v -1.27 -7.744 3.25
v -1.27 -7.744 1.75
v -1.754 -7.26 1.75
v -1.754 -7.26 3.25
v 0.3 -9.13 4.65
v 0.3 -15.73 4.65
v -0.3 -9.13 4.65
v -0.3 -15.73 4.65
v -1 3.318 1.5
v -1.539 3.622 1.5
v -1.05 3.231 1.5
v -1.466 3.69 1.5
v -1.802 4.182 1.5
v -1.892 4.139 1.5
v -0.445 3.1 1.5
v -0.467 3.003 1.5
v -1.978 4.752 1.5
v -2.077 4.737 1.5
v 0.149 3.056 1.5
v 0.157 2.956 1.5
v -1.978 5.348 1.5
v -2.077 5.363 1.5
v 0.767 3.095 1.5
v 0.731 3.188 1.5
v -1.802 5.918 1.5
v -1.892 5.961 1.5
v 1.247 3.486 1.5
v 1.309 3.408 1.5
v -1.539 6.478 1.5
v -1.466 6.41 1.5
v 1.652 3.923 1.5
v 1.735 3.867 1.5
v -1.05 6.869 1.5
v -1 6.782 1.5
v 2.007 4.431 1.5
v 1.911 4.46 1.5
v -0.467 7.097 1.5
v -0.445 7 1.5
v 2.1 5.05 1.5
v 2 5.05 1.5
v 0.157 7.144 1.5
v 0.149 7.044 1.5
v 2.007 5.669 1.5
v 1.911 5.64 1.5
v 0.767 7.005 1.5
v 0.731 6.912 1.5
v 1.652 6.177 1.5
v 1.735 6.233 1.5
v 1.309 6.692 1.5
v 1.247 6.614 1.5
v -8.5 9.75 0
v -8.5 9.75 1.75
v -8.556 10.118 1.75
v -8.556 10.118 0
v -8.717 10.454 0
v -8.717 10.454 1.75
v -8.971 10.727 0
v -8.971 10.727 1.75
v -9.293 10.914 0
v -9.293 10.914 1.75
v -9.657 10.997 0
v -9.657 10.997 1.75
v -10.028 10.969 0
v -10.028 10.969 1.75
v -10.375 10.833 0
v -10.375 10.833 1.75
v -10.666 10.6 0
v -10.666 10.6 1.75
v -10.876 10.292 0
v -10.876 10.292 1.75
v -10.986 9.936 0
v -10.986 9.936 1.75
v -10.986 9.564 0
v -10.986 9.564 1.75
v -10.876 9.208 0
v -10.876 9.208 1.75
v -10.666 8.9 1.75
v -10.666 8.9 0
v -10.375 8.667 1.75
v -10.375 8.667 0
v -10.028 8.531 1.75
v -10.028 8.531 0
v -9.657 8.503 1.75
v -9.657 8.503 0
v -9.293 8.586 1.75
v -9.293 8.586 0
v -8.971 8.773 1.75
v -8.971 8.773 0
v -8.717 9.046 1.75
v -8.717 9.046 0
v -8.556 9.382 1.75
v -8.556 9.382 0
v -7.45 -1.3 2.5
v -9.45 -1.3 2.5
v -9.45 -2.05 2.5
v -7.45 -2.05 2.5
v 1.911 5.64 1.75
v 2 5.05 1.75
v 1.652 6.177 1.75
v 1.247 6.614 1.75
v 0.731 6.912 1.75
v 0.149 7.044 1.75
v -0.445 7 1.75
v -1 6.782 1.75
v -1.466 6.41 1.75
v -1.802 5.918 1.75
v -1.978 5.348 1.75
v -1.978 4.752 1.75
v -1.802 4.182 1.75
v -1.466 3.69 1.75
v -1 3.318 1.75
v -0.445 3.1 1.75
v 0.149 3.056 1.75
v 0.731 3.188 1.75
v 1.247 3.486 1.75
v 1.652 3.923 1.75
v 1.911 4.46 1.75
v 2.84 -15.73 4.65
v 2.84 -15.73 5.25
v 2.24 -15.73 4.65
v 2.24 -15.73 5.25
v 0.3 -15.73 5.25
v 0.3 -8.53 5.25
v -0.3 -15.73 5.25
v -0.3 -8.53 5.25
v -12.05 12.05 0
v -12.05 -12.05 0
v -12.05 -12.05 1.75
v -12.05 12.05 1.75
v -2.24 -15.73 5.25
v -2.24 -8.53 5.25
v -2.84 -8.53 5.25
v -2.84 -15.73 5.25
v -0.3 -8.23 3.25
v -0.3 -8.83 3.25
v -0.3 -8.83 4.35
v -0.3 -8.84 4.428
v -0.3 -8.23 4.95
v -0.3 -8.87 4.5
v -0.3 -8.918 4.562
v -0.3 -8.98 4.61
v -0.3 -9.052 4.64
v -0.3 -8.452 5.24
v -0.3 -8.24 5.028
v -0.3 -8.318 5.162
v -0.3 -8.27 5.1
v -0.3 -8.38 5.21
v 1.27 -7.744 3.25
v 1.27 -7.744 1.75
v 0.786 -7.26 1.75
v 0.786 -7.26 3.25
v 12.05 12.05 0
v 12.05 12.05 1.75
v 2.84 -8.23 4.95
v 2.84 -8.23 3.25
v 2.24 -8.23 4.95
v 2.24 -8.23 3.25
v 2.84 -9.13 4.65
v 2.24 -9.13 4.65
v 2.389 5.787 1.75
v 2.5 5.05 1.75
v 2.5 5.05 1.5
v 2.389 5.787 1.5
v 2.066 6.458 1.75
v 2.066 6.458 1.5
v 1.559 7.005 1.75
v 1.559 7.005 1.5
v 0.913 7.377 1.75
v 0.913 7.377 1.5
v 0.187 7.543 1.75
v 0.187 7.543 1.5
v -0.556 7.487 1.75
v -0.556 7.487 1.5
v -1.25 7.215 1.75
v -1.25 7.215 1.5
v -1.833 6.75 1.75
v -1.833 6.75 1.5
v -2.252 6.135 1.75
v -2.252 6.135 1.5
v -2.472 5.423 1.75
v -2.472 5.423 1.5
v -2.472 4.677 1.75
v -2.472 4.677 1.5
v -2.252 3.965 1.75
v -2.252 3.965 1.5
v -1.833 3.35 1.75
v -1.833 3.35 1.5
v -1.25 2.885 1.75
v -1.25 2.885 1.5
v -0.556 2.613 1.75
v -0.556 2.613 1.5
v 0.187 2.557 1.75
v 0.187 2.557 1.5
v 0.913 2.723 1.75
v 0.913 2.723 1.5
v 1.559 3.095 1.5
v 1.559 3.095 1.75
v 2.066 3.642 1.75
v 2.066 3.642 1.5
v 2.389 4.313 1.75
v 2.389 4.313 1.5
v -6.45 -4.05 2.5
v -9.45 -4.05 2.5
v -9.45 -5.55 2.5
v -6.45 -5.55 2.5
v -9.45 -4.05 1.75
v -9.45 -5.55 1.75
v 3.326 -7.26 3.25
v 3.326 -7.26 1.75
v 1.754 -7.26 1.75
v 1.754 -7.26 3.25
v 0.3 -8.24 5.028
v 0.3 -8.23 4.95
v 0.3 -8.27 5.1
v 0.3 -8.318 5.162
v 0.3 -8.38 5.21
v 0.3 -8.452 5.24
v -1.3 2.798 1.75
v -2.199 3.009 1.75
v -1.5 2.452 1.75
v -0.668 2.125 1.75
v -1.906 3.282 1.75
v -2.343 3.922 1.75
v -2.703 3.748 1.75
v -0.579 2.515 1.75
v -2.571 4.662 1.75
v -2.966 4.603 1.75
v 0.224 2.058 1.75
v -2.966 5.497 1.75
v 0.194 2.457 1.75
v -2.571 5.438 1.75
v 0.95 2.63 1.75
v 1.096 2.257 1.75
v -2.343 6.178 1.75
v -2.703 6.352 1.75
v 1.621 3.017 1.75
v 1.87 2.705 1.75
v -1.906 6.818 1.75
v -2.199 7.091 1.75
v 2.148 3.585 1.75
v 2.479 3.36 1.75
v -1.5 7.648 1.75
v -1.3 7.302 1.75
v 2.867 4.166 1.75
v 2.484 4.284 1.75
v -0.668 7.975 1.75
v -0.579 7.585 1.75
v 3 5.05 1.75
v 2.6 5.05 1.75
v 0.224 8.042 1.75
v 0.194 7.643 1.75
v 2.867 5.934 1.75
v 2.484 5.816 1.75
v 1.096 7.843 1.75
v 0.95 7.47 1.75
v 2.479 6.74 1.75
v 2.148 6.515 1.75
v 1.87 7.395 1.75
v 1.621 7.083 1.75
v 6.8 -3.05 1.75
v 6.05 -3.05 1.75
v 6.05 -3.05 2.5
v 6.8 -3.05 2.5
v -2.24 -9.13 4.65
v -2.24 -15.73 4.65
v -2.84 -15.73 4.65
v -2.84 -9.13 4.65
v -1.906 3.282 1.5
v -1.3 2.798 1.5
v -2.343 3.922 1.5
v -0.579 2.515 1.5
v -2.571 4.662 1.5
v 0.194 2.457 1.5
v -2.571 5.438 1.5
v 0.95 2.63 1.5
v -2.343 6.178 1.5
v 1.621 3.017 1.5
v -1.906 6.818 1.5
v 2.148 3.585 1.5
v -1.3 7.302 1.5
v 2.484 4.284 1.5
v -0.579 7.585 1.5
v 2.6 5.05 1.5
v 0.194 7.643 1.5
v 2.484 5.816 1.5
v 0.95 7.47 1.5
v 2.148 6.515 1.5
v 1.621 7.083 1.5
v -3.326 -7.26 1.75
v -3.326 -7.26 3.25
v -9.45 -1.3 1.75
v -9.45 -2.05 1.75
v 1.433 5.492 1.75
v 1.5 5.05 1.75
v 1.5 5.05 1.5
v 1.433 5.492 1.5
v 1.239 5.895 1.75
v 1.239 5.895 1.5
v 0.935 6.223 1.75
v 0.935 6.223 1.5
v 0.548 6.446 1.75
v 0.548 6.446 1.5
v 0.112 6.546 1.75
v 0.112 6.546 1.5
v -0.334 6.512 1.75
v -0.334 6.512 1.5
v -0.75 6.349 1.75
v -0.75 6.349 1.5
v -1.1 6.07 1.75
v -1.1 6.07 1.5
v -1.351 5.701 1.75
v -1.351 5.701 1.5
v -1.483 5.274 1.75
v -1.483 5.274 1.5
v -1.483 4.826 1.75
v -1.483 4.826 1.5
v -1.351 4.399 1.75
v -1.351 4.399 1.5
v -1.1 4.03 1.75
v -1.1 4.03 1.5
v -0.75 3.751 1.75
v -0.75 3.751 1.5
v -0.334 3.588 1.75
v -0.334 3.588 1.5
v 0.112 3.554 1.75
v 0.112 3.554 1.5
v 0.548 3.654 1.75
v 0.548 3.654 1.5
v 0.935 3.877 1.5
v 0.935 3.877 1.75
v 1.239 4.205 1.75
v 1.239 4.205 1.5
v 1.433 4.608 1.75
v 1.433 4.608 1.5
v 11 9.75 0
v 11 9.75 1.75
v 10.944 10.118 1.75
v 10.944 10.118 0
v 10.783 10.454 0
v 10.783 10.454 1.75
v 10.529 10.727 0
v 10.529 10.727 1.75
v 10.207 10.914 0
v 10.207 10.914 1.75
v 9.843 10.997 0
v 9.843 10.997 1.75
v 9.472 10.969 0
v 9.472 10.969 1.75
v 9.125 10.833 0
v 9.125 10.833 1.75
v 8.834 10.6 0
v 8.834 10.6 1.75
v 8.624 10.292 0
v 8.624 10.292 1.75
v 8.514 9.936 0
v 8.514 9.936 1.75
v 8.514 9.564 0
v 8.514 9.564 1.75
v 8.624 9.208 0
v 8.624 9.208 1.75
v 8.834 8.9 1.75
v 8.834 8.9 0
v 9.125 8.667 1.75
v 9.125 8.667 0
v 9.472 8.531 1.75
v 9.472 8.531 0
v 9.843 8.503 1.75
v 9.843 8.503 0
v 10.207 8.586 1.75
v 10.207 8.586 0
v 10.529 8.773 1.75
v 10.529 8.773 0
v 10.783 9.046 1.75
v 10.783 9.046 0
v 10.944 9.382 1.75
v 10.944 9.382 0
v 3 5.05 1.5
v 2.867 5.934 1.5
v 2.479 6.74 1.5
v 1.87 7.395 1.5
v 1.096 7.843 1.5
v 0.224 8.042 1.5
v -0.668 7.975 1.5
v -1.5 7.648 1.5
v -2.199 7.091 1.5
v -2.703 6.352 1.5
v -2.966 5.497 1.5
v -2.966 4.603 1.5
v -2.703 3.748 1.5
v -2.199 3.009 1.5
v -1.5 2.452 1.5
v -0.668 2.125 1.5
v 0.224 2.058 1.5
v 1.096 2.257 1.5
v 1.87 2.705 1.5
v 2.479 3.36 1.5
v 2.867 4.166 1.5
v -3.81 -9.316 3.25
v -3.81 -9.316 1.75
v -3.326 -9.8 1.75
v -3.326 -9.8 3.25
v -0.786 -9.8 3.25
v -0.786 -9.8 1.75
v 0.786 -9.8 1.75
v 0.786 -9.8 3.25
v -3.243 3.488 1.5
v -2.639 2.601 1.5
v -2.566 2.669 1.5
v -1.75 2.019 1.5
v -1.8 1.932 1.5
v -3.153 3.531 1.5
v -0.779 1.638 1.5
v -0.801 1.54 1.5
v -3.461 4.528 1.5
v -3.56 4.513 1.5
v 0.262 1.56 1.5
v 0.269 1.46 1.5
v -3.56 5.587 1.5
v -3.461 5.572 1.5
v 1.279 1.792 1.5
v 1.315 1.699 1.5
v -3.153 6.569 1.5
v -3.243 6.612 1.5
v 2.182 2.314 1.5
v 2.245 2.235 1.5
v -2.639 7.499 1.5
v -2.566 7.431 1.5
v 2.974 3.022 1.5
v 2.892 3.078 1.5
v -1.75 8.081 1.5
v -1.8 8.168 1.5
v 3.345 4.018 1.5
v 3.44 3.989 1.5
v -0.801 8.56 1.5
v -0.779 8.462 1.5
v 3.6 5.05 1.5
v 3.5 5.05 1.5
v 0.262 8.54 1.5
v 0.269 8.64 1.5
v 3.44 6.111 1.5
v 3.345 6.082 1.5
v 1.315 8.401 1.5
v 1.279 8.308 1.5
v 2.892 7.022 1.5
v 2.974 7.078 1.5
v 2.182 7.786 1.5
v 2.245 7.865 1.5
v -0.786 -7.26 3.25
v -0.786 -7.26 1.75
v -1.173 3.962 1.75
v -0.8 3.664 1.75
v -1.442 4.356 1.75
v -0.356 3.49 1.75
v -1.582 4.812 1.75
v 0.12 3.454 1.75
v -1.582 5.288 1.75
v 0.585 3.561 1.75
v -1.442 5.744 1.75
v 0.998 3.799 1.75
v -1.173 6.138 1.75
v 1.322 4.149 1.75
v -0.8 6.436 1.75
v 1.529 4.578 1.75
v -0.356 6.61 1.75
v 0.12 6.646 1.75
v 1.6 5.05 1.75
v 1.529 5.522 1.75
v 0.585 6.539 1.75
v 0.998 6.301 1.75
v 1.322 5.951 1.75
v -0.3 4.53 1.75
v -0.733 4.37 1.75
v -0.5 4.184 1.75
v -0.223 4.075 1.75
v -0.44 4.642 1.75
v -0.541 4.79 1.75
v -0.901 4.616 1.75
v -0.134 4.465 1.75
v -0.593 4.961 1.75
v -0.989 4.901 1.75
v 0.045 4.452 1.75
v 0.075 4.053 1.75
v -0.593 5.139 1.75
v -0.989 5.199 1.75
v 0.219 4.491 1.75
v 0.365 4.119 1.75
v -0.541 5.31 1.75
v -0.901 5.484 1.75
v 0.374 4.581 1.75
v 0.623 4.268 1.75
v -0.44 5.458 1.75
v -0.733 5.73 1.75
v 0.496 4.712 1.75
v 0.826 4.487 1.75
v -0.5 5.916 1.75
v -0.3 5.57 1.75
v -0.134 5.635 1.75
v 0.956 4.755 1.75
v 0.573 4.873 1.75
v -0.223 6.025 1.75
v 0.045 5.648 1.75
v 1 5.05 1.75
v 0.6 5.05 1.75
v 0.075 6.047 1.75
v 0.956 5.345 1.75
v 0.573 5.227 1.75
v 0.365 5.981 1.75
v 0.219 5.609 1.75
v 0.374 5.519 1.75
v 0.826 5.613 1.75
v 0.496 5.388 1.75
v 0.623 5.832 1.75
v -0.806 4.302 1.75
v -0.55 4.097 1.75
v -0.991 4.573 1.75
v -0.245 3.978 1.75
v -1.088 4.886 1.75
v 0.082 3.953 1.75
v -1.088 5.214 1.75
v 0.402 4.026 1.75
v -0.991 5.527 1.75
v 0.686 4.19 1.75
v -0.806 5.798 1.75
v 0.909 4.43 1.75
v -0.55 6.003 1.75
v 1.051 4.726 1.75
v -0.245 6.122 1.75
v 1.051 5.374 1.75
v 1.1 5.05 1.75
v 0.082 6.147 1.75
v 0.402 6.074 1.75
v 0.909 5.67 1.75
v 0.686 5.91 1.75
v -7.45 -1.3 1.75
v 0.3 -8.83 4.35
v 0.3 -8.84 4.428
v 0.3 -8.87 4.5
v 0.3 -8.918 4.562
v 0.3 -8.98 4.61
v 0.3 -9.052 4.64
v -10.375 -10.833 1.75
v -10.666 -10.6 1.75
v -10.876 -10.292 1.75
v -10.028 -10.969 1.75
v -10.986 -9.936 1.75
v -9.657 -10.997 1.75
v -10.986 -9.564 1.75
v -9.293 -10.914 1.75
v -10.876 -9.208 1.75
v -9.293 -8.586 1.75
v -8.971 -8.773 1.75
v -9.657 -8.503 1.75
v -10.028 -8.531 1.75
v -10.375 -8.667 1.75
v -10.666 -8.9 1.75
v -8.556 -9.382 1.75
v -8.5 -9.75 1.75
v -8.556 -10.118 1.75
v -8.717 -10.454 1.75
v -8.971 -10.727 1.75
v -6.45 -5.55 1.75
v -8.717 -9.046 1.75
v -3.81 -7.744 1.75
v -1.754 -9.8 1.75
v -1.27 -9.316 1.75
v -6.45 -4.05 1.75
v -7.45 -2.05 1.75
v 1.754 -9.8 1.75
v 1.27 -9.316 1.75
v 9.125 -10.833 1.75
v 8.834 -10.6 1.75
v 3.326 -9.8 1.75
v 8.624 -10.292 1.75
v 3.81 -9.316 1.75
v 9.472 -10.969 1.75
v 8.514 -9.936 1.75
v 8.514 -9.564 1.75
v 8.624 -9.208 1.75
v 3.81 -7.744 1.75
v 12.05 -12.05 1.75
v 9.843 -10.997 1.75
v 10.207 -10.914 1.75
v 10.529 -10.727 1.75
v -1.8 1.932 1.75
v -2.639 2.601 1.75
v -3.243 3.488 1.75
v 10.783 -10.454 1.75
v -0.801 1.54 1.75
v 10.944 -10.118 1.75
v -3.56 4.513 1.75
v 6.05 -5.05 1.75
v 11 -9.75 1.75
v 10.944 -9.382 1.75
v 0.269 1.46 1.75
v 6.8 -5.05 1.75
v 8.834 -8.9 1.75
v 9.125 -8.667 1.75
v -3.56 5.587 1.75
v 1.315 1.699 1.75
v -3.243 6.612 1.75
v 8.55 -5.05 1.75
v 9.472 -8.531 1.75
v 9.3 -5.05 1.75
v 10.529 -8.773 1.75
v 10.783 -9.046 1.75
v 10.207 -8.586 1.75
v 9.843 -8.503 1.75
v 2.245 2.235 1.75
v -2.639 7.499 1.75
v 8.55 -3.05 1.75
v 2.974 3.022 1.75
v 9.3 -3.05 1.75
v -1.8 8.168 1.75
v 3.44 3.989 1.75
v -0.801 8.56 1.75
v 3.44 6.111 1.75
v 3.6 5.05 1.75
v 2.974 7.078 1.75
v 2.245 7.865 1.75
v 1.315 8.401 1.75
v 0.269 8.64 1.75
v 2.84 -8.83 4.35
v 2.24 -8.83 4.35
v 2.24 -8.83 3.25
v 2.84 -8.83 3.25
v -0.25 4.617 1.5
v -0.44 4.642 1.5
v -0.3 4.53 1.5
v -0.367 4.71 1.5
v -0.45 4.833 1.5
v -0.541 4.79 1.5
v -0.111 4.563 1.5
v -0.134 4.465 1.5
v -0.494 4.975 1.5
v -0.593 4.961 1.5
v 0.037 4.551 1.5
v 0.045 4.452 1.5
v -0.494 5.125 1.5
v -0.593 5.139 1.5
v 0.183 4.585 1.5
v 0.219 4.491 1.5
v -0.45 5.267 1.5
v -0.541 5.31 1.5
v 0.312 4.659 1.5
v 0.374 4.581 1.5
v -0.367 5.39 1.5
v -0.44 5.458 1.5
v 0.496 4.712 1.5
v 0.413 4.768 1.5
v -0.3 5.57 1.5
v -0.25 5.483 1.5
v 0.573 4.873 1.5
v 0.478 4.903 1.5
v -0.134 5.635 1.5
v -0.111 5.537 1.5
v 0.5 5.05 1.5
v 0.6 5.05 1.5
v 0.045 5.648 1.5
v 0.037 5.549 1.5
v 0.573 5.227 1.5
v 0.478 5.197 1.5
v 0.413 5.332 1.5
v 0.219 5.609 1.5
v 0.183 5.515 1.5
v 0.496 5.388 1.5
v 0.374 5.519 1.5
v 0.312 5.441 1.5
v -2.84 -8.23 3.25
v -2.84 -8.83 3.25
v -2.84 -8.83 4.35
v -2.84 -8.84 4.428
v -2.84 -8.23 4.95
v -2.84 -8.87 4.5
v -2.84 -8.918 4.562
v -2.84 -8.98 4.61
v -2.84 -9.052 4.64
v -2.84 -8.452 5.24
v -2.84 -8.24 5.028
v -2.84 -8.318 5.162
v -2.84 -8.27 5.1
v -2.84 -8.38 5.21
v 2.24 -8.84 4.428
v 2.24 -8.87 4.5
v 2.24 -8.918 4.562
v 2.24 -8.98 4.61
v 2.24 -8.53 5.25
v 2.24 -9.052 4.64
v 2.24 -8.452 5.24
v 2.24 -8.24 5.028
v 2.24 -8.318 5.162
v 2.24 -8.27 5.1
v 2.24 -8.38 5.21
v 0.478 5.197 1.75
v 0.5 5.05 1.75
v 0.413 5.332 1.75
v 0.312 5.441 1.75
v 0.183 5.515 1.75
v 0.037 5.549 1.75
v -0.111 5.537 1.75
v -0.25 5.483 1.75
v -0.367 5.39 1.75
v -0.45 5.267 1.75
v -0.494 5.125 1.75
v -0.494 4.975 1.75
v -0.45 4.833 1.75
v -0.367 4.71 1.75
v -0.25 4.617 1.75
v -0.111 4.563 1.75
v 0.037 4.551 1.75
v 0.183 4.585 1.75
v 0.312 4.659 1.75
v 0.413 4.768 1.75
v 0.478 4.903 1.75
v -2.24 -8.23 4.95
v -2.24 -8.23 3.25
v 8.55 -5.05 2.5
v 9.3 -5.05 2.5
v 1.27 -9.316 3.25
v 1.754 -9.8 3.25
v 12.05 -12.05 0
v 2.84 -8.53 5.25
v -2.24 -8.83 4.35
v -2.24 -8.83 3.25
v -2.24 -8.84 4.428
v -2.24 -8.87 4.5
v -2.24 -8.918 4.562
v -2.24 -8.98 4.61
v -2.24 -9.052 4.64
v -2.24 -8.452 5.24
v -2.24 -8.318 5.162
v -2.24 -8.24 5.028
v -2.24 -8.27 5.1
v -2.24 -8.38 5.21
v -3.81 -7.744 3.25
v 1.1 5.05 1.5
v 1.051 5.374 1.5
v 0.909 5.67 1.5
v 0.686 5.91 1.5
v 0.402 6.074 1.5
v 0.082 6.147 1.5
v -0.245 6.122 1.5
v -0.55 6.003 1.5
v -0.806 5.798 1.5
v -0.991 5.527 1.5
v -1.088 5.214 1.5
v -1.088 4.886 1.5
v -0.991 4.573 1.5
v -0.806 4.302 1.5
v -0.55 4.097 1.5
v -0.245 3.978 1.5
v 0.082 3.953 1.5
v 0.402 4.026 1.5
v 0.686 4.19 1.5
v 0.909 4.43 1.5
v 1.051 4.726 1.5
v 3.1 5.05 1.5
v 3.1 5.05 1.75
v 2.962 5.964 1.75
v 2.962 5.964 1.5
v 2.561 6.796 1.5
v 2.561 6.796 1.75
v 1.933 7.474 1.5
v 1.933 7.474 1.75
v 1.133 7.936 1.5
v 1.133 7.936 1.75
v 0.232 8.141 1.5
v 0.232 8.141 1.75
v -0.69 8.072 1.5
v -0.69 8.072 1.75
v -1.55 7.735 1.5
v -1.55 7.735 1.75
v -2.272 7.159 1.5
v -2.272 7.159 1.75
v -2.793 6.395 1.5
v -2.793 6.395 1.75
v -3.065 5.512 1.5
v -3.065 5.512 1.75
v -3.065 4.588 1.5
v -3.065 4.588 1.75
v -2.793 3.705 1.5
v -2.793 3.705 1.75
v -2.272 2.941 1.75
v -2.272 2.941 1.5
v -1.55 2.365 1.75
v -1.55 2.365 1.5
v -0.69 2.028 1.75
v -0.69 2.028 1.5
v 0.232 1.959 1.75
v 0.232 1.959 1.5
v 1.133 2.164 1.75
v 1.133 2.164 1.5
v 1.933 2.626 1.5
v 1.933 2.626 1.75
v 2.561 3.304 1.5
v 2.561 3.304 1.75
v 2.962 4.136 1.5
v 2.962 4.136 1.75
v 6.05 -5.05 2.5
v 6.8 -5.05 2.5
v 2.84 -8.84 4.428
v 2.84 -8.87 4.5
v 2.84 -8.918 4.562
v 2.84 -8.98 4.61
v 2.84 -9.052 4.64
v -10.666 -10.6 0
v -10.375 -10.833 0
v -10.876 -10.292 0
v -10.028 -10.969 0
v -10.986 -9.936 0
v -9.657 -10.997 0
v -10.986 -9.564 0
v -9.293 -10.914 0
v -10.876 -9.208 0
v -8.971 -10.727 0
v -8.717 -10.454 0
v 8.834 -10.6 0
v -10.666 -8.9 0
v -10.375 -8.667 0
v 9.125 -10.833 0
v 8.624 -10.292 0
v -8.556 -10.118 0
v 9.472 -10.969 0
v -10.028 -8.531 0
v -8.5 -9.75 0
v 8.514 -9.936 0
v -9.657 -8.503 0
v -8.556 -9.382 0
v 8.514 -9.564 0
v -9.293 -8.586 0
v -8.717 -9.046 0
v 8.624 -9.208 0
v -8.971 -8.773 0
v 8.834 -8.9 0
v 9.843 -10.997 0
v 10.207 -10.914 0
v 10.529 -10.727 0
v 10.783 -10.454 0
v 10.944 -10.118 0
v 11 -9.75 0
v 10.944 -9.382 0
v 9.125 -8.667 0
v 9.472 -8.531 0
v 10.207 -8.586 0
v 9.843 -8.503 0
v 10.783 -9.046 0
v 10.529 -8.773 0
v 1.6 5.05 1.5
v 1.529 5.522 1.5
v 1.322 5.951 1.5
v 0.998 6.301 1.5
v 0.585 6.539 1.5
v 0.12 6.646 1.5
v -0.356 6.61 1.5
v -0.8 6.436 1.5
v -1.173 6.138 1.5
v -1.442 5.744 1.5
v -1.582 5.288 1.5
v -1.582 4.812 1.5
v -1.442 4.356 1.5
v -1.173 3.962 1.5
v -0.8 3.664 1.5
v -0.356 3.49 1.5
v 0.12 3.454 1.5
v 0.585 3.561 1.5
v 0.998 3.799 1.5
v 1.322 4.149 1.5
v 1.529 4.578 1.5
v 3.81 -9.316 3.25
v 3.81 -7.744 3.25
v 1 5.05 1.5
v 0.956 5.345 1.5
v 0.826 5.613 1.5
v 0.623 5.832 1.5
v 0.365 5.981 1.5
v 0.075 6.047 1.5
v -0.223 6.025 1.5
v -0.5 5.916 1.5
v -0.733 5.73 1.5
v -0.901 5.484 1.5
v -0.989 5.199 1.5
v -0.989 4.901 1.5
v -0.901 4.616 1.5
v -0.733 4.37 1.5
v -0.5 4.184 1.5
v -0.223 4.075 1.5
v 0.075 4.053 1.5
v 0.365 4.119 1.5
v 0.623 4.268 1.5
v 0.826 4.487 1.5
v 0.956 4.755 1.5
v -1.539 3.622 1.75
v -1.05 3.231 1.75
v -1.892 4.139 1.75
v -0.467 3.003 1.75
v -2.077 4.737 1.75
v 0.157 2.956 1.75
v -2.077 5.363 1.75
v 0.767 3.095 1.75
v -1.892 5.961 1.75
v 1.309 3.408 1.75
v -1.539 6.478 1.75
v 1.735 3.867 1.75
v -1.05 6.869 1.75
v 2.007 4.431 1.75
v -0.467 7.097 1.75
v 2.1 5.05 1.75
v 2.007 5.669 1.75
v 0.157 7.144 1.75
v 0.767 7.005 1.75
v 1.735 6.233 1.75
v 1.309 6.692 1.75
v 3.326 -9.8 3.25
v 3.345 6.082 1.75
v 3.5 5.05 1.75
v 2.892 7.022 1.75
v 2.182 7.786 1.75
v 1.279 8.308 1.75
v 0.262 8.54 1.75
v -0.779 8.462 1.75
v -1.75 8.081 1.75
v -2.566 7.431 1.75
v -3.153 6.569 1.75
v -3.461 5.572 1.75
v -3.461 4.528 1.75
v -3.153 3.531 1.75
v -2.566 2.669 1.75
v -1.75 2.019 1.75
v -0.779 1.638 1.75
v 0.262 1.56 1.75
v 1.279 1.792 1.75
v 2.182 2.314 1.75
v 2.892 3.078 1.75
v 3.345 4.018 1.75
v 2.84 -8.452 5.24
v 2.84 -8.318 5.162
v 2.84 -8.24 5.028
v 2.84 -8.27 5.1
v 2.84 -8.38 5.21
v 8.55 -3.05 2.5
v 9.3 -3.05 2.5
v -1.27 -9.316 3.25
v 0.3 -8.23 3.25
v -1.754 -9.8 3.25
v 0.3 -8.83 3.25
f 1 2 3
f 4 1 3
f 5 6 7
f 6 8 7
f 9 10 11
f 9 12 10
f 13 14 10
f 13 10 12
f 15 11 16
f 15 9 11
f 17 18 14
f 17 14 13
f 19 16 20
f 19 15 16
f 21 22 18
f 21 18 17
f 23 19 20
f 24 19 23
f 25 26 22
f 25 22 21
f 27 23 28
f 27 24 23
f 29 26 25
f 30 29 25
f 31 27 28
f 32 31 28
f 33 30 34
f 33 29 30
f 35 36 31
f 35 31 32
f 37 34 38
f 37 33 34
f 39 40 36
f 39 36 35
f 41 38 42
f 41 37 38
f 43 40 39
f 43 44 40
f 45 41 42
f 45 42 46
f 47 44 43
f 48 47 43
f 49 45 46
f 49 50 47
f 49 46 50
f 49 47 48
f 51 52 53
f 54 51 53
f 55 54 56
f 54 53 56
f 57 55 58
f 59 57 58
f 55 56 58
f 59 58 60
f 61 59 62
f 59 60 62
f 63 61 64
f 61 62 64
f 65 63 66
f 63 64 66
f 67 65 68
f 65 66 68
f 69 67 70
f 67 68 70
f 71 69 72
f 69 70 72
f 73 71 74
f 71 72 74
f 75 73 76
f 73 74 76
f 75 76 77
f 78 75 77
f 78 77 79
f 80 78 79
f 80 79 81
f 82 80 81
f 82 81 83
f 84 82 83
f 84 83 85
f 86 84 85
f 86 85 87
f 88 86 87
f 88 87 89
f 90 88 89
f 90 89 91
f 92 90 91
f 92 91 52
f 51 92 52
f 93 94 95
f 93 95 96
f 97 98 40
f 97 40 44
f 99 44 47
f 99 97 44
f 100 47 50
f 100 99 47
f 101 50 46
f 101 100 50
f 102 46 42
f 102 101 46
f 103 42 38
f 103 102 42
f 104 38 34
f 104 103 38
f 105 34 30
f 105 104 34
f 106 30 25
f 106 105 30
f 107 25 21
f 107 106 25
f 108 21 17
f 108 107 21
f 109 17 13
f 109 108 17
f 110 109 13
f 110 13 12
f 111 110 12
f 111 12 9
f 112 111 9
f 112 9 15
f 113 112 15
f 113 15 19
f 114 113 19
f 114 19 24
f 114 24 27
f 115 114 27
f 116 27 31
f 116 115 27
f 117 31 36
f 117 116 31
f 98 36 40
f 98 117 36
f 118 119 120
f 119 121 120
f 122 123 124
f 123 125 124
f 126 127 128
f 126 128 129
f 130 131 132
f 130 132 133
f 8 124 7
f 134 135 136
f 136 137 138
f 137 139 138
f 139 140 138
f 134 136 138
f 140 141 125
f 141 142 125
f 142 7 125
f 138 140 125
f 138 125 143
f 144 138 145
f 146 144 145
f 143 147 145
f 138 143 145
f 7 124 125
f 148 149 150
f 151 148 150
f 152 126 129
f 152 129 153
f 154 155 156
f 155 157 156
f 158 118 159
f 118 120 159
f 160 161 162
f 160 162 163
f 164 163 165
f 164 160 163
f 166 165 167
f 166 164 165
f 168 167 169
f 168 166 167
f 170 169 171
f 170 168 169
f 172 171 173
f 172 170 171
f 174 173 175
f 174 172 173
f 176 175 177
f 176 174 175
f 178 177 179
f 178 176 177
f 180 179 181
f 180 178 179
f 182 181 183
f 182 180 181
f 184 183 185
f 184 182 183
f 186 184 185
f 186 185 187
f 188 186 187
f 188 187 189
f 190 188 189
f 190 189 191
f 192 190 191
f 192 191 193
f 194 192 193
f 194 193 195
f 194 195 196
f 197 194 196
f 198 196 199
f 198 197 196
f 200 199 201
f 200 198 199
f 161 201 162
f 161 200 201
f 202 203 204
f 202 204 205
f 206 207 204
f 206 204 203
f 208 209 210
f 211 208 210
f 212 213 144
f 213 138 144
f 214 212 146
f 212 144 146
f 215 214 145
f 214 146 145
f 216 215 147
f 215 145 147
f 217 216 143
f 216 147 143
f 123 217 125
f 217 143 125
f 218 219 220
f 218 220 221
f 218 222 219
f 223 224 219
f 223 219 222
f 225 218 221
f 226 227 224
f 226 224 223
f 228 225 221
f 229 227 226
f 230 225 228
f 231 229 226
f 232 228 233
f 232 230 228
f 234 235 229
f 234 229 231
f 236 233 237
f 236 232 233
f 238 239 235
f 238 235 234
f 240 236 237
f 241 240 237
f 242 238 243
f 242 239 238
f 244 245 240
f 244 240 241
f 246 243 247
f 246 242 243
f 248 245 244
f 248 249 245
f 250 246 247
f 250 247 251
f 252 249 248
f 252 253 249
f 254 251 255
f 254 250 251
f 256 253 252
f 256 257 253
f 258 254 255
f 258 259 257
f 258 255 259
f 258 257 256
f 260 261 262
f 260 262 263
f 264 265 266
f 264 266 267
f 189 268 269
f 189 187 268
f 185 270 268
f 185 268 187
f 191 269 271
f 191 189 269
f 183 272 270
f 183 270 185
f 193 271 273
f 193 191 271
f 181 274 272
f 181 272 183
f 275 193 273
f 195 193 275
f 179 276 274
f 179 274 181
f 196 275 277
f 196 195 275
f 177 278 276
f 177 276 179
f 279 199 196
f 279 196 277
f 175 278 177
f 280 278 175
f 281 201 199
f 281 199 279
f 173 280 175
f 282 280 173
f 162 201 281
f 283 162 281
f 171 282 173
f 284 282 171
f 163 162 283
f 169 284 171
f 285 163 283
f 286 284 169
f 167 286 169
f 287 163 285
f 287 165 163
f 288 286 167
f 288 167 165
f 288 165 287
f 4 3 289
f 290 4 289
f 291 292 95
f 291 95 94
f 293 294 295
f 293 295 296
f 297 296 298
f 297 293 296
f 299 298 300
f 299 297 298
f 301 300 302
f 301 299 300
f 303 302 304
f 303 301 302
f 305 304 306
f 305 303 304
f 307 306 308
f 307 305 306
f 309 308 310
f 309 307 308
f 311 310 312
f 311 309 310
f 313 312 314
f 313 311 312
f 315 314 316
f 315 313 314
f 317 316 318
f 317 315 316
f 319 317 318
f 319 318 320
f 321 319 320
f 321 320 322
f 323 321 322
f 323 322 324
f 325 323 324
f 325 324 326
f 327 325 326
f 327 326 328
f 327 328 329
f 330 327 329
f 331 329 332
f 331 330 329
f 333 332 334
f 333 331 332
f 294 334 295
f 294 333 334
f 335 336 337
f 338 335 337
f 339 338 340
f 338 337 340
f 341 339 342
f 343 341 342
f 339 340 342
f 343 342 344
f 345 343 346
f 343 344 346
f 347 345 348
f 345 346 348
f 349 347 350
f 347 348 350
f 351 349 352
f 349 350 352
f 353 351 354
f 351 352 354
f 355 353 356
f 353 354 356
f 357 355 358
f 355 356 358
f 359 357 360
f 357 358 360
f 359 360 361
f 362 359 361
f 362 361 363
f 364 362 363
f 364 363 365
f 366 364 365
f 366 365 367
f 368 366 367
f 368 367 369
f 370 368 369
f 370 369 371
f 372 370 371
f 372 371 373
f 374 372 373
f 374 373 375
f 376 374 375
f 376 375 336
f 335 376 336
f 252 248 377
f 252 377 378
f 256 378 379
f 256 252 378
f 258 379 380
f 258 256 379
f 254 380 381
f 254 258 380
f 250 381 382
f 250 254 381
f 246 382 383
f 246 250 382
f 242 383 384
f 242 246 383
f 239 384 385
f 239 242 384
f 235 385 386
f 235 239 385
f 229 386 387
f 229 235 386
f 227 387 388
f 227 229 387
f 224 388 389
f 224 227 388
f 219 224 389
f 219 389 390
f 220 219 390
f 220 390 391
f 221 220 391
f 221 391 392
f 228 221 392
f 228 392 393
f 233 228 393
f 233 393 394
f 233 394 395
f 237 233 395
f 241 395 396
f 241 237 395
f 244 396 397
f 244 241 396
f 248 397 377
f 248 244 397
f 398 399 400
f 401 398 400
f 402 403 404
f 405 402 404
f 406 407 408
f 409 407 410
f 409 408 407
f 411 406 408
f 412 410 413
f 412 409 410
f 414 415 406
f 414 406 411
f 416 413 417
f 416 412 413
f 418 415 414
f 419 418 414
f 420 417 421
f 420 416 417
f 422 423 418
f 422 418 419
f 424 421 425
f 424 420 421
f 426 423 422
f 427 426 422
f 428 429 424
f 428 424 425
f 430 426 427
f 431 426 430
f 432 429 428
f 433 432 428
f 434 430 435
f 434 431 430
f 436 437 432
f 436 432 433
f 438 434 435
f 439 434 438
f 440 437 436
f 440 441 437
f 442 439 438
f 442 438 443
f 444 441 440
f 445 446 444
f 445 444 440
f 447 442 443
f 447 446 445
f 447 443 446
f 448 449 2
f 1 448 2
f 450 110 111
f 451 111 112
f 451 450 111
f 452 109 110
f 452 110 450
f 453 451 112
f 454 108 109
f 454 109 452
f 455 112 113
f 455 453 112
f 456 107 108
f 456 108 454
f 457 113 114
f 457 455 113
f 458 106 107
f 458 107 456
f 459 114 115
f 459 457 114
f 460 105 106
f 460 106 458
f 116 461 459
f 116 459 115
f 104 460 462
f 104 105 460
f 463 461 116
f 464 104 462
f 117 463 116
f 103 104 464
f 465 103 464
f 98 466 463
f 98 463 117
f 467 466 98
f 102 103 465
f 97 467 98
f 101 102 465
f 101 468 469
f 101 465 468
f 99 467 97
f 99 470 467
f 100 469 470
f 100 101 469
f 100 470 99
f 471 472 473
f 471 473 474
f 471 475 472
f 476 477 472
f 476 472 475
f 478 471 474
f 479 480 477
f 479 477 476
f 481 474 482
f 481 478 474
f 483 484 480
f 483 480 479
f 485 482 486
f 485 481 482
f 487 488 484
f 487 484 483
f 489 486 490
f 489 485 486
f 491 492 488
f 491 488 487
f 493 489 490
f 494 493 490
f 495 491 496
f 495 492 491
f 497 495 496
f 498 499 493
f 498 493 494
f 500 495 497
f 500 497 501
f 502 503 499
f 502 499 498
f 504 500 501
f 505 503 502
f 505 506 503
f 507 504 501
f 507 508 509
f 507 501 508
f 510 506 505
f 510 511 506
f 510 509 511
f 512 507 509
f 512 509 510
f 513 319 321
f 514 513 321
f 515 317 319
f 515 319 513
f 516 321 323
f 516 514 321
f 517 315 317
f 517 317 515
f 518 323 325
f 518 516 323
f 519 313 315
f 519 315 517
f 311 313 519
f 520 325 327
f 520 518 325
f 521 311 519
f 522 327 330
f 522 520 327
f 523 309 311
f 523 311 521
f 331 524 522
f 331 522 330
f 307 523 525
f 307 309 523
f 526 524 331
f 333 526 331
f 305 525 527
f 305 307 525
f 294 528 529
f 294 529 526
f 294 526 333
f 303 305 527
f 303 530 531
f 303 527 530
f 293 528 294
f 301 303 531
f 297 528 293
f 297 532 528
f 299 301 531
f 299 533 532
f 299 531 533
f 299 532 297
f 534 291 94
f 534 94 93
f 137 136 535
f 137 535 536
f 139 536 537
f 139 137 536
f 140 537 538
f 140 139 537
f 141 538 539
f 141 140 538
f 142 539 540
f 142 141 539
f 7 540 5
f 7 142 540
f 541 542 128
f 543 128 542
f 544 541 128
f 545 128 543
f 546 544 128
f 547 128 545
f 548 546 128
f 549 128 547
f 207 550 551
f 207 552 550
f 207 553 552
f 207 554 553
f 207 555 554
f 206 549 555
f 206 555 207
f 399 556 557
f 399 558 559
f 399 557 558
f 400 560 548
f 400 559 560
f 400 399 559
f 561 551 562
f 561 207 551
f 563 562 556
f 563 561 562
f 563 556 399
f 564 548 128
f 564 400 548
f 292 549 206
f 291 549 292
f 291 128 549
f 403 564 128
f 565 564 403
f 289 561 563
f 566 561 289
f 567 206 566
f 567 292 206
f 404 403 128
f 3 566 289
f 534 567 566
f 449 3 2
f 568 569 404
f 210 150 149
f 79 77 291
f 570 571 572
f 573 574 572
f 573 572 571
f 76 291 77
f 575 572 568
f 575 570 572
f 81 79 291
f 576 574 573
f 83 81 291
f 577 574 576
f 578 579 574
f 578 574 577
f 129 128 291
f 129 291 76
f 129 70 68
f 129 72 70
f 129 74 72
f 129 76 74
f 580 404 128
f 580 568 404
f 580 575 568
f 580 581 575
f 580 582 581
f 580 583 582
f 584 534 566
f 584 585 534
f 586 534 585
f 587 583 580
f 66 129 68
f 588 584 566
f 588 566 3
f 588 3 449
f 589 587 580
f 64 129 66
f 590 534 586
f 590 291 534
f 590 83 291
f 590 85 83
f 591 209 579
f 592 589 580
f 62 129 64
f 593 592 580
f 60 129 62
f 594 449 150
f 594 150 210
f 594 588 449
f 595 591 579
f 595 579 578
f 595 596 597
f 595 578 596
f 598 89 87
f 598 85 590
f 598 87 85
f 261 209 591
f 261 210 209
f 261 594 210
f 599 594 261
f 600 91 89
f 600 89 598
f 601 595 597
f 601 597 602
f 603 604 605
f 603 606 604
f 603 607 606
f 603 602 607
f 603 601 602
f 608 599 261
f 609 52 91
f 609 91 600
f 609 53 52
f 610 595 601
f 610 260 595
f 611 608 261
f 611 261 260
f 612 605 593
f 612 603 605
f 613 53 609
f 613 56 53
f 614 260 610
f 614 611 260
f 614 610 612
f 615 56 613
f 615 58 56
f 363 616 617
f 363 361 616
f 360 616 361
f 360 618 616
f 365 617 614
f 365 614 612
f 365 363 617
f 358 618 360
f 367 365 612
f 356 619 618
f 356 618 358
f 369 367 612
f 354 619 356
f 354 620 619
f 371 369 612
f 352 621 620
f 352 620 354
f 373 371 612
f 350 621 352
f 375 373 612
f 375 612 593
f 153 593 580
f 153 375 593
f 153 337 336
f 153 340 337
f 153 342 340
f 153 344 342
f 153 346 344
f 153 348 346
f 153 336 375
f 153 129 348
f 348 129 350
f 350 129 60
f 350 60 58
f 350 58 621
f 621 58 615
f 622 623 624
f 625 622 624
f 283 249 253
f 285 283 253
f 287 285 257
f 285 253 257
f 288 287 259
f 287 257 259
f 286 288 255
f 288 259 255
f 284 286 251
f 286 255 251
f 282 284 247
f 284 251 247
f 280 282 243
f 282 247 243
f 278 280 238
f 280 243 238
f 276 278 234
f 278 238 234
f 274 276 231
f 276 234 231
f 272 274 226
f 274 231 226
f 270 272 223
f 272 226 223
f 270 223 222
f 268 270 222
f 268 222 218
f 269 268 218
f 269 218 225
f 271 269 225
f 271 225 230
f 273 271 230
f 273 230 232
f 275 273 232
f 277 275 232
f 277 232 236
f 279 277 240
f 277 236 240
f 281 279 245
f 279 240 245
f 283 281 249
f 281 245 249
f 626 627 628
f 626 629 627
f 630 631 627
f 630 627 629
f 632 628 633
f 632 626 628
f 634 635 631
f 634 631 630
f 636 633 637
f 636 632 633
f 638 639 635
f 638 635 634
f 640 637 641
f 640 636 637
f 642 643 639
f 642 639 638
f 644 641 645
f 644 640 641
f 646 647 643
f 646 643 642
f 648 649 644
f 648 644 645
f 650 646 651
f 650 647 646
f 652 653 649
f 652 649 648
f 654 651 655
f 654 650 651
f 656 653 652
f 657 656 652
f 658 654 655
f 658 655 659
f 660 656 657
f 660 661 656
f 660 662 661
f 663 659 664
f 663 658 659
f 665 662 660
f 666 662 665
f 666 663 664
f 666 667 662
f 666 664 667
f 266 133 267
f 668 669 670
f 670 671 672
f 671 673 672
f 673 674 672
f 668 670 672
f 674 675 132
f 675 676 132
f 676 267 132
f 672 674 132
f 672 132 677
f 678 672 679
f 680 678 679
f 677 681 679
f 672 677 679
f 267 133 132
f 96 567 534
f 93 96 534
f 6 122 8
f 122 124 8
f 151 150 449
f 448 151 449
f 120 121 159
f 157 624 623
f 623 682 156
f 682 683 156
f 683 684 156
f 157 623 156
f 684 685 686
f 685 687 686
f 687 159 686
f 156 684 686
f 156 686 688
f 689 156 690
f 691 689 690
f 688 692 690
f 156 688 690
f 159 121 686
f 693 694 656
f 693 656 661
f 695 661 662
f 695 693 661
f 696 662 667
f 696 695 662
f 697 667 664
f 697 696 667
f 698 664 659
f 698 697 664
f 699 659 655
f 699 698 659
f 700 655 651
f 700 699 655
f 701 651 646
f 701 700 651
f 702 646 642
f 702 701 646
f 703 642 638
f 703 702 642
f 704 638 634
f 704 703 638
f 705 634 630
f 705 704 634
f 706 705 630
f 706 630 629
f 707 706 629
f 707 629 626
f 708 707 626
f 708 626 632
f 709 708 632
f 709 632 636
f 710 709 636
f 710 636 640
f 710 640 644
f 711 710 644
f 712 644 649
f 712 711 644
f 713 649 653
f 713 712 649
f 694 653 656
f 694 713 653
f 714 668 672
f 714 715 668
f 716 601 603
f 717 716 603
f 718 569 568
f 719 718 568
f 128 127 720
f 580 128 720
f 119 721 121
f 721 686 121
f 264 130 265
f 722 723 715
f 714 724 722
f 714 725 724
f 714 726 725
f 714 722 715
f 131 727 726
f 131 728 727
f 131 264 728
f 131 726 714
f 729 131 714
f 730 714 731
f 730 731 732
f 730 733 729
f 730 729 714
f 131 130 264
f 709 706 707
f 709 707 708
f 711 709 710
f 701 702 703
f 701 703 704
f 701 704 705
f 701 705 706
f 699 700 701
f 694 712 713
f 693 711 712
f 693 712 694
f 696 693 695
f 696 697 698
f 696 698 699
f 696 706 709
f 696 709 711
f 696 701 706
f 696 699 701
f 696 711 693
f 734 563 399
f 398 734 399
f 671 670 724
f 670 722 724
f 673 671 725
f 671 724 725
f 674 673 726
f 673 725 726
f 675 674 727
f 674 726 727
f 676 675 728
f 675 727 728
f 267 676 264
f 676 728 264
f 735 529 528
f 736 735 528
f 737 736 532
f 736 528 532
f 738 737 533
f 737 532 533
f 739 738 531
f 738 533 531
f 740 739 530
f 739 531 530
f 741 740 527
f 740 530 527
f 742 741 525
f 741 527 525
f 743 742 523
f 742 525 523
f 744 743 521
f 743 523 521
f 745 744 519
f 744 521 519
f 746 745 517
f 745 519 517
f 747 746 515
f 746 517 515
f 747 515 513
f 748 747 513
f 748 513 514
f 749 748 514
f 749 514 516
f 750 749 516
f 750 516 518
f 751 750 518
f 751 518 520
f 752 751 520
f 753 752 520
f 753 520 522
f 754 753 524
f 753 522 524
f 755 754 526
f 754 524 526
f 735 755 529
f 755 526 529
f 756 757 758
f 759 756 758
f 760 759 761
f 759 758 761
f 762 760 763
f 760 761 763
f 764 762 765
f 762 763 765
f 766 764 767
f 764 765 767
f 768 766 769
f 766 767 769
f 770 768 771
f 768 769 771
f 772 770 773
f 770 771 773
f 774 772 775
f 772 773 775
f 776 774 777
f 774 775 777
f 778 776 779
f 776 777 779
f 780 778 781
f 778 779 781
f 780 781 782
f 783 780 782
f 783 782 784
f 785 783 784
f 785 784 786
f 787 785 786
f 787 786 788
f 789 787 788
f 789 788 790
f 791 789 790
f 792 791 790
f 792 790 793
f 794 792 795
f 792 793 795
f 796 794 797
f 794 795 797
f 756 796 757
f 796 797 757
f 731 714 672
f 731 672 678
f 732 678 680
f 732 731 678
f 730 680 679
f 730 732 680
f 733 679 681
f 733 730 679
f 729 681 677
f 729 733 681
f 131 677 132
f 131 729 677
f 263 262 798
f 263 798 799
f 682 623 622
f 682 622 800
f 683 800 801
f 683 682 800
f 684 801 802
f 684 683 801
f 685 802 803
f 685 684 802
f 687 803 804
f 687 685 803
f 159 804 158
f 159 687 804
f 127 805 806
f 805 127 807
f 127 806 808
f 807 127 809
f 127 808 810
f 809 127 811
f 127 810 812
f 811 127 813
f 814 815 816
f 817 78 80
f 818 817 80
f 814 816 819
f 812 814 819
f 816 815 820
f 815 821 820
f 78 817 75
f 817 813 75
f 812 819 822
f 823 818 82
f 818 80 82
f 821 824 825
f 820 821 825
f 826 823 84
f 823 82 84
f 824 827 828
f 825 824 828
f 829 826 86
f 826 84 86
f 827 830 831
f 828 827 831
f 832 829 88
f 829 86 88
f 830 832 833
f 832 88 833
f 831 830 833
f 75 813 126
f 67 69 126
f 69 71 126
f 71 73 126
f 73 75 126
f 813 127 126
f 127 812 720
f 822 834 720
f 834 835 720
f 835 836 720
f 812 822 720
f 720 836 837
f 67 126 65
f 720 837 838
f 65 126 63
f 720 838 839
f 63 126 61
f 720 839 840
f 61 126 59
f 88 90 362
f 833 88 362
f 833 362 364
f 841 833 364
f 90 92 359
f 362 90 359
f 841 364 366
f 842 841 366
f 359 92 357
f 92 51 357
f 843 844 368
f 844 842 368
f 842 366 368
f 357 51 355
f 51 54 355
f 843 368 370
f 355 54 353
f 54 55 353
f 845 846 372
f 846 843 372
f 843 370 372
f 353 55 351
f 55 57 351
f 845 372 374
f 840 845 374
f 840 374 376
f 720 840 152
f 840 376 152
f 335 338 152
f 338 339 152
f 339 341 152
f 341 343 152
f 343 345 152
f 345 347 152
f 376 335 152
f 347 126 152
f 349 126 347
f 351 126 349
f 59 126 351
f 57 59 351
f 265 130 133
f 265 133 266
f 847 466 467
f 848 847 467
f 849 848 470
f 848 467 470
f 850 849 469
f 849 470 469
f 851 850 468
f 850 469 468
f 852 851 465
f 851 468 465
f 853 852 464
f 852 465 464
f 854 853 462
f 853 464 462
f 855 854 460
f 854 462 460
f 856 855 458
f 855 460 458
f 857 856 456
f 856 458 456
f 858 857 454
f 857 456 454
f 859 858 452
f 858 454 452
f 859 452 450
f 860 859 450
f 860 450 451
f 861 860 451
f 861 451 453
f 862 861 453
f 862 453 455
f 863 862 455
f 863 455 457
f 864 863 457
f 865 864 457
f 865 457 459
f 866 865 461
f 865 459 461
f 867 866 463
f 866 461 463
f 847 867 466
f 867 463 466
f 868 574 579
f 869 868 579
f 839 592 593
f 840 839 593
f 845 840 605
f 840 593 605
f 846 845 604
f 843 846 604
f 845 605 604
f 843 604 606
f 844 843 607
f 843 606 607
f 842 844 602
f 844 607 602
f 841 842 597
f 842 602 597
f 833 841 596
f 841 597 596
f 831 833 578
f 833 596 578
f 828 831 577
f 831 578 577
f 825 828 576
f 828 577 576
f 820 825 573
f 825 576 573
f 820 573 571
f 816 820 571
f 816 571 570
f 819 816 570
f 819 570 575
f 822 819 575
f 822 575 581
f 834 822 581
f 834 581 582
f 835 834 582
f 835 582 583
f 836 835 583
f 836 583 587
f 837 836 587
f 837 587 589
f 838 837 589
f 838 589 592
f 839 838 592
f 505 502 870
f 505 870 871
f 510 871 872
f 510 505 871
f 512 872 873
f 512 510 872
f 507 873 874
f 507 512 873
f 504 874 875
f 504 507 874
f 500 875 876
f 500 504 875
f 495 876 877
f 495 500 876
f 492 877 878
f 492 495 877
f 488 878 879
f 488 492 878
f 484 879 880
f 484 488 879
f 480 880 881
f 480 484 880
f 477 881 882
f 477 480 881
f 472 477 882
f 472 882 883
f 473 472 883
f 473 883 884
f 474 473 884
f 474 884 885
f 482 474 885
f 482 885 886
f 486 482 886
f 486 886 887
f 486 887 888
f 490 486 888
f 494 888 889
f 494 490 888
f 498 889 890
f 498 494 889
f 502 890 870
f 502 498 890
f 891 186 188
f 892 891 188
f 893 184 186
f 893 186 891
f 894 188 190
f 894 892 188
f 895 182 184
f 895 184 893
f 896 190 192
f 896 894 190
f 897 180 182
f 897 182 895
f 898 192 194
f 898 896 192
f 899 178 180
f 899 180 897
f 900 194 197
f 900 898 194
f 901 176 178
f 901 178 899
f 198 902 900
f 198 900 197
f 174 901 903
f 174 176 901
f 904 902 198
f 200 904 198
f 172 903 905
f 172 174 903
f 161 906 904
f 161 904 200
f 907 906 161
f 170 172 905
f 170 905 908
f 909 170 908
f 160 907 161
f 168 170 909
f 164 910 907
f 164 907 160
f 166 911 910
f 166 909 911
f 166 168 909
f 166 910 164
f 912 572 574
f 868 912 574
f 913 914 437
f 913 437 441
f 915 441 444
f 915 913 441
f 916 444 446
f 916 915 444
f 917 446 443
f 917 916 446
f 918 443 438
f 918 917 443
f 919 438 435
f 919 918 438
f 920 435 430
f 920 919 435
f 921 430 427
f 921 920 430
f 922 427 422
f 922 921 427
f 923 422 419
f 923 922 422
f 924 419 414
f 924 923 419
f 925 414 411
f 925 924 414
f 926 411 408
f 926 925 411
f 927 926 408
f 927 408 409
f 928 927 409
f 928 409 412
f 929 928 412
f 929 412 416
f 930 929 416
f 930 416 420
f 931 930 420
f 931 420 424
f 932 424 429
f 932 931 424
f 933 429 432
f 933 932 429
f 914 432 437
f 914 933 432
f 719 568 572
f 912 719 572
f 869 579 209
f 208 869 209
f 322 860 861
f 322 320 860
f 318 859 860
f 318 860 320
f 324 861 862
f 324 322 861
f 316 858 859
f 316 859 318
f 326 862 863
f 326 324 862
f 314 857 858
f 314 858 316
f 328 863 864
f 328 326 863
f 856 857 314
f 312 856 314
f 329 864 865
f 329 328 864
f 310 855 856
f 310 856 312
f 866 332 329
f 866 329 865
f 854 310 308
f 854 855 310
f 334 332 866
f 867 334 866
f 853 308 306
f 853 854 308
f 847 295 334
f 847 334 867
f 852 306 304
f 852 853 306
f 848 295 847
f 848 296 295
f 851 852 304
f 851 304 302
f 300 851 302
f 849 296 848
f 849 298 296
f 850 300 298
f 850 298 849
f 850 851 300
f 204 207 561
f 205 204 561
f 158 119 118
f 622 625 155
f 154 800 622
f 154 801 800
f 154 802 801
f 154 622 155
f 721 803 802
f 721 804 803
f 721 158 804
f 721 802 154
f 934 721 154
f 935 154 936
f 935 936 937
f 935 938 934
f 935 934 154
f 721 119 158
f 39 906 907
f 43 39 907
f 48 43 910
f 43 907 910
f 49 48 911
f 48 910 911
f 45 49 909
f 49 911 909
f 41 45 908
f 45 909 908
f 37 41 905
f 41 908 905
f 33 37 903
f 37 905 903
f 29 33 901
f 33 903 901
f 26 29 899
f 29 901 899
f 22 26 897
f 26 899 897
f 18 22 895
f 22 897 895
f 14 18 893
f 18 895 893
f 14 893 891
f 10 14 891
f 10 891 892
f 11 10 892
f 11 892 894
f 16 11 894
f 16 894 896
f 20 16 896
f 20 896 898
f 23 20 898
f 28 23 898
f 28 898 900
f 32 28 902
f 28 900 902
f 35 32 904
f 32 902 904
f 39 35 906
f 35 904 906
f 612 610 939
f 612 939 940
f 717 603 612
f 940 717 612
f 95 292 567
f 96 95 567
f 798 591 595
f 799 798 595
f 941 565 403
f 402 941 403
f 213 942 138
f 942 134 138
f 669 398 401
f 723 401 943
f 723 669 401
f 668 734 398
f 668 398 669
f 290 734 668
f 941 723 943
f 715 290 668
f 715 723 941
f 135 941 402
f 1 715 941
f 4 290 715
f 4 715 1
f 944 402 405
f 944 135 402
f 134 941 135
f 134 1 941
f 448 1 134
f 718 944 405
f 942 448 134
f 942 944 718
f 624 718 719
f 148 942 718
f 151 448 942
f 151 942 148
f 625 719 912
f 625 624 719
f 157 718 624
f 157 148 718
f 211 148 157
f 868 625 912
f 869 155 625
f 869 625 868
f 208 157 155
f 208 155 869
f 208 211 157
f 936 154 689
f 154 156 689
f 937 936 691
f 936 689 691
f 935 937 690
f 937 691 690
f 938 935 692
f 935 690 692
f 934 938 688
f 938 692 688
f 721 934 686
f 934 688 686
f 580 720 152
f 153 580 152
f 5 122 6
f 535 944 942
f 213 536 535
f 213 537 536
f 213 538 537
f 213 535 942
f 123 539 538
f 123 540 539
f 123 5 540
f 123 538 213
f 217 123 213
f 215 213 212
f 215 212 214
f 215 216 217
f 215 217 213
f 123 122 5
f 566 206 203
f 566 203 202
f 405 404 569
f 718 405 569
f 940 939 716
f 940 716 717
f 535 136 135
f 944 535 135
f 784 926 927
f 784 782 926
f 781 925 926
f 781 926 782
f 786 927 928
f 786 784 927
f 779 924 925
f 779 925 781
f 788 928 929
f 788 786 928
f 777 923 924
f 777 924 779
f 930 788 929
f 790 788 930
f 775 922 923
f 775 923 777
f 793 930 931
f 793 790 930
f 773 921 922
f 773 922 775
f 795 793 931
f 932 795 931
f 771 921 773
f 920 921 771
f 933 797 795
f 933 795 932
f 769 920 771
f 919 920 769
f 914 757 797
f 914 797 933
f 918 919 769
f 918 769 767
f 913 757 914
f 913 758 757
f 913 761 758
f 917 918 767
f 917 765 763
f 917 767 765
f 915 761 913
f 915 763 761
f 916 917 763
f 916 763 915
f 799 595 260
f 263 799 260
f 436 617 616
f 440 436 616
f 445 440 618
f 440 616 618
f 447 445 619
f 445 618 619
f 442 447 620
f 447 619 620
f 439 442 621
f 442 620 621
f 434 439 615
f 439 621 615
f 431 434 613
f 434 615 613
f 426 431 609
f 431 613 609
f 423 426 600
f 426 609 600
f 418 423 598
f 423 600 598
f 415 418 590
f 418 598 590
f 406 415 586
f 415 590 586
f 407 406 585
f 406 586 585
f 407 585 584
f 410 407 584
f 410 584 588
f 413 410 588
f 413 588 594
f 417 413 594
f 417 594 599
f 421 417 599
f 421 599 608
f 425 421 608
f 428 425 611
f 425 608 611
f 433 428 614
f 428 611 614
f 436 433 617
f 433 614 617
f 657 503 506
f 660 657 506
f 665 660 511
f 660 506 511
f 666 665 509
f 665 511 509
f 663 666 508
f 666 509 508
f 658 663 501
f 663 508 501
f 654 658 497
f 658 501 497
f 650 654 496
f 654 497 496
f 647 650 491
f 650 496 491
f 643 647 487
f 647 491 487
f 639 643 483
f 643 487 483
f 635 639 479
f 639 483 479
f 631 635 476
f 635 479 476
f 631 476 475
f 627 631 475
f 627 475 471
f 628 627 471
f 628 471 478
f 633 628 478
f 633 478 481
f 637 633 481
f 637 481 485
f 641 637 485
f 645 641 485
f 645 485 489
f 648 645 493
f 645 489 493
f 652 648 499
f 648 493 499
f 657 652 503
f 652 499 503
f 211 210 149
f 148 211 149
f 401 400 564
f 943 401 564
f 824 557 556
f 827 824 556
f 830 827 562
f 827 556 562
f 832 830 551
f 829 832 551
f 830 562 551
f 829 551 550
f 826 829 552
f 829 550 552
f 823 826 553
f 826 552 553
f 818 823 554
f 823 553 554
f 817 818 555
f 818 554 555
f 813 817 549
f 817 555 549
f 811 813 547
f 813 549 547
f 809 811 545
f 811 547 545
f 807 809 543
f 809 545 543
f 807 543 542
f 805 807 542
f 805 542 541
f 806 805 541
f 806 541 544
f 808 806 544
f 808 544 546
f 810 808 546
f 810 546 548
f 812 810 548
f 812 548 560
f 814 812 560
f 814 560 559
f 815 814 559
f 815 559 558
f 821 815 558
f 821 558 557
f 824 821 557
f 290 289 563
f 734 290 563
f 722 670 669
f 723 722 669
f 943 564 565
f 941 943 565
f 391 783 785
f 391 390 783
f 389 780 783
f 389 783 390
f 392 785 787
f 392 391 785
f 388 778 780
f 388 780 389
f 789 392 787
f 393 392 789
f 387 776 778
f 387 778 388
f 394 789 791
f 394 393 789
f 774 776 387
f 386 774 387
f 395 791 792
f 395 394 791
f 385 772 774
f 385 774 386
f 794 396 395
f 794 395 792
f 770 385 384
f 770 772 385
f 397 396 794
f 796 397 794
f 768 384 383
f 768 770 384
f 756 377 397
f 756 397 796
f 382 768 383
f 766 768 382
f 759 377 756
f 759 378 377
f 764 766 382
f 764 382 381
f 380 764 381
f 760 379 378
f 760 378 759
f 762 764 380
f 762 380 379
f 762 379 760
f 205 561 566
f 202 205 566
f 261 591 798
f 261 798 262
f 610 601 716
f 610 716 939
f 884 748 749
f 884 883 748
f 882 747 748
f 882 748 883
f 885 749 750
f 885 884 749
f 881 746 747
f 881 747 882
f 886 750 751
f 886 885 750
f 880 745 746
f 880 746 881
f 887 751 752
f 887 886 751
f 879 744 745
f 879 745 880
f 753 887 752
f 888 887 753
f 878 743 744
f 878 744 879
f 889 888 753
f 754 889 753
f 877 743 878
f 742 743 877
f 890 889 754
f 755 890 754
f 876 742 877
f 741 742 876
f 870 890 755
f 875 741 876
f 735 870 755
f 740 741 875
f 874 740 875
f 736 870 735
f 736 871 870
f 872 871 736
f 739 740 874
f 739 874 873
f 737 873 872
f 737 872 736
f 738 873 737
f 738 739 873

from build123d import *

# Parameters (mm, degrees)
SKETCH_W            = 24.1
SKETCH_H            = 24.1
PAD_DEPTH           = 1.75
SKETCH001_R         = 1.25
POCKET_DEPTH        = 1.751
PAD001_DEPTH        = 1.5
PAD002_DEPTH        = 0.3
PAD002_DEPTH_BACK   = 0.3
LINEARPATTERN_COUNT = 3
LINEARPATTERN_PITCH = 2.54
SKETCH005_W         = 0.75
SKETCH005_H         = 2
SKETCH005_W_2       = 3
SKETCH005_H_2       = 1.5
SKETCH005_W_3       = 2
SKETCH005_H_3       = 0.75
PAD003_DEPTH        = 0.75
SKETCH006_R         = 0.6
SKETCH006_R_2       = 0.5
POCKET001_DEPTH     = 0.25
SKETCH007_R         = 1.1
SKETCH007_R_2       = 1
POCKET002_DEPTH     = 0.25
SKETCH008_R         = 1.6
SKETCH008_R_2       = 1.5
POCKET003_DEPTH     = 0.25
SKETCH009_R         = 2.1
SKETCH009_R_2       = 2
POCKET004_DEPTH     = 0.25
SKETCH010_R         = 2.6
SKETCH010_R_2       = 2.5
POCKET005_DEPTH     = 0.25
SKETCH011_R         = 3.1
SKETCH011_R_2       = 3
POCKET006_DEPTH     = 0.25
SKETCH012_R         = 3.6
SKETCH012_R_2       = 3.5
POCKET007_DEPTH     = 0.25


with BuildPart() as part:
    # Sketch → Pad (new body)
    with BuildSketch(Plane.XY):
        Rectangle(SKETCH_W, SKETCH_H)
    extrude(amount=PAD_DEPTH)

    # Sketch001 (on Face6 of Pad) → Pocket (cut, through all)
    with BuildSketch(Plane.XY.offset(1.75)):
        with Locations((-9.75, 9.75)):
            Circle(SKETCH001_R)
        with Locations((9.75, 9.75)):
            Circle(SKETCH001_R)
        with Locations((-9.75, -9.75)):
            Circle(SKETCH001_R)
        with Locations((9.75, -9.75)):
            Circle(SKETCH001_R)
    extrude(amount=-POCKET_DEPTH, mode=Mode.SUBTRACT)

    # Sketch002 (on Face5 of Pocket) → Pad001 (join)
    with BuildSketch(Plane.XY.offset(1.75)):
        Polygon((-3.81, -7.744125), (-3.81, -9.315875), (-3.325875, -9.8), (-1.754125, -9.8), (-1.27, -9.315875), (-1.27, -7.744125), (-1.754125, -7.26), (-3.325875, -7.26), align=None)
    pad001 = extrude(amount=PAD001_DEPTH)

    # Sketch004 (on DatumPlane) → Pad002 (join, two sides)
    with BuildSketch(Plane.YZ.offset(-2.54)) as pad002_sk:
        with BuildLine():
            Line((-8.83, 3.25), (-8.23, 3.25))
            Line((-8.23, 3.25), (-8.23, 4.95))
            ThreePointArc((-8.23, 4.95), (-8.317868, 5.162132), (-8.53, 5.25))
            Line((-8.53, 5.25), (-15.73, 5.25))
            Line((-15.73, 5.25), (-15.73, 4.65))
            Line((-15.73, 4.65), (-9.13, 4.65))
            ThreePointArc((-8.83, 4.35), (-8.917868, 4.562132), (-9.13, 4.65))
            Line((-8.83, 4.35), (-8.83, 3.25))
        make_face()
    pad002 = extrude(amount=PAD002_DEPTH) + extrude(pad002_sk.sketch, amount=-PAD002_DEPTH_BACK)

    # LinearPattern: Pad002, Pad001 ×3
    with Locations(*[(i * LINEARPATTERN_PITCH, 0, 0) for i in range(1, LINEARPATTERN_COUNT)]):
        add(pad002)
        add(pad001)

    # Sketch005 (on Face5 of LinearPattern) → Pad003 (join)
    with BuildSketch(Plane.XY.offset(1.75)):
        with Locations((8.925, -4.05)):
            Rectangle(SKETCH005_W, SKETCH005_H)
        with Locations((6.425, -4.05)):
            Rectangle(SKETCH005_W, SKETCH005_H)
        with Locations((-7.95, -4.8)):
            Rectangle(SKETCH005_W_2, SKETCH005_H_2)
        with Locations((-8.45, -1.675)):
            Rectangle(SKETCH005_W_3, SKETCH005_H_3)
    extrude(amount=PAD003_DEPTH)

    # Sketch006 (on Face5 of Pad003) → Pocket001 (cut)
    with BuildSketch(Plane.XY.offset(1.75)):
        with Locations((0, 5.05)):
            Circle(SKETCH006_R)
        with Locations((0, 5.05)):
            Circle(SKETCH006_R_2, mode=Mode.SUBTRACT)
    extrude(amount=-POCKET001_DEPTH, mode=Mode.SUBTRACT)

    # Sketch007 (on Face5 of Pocket001) → Pocket002 (cut)
    with BuildSketch(Plane.XY.offset(1.75)):
        with Locations((0, 5.05)):
            Circle(SKETCH007_R)
        with Locations((0, 5.05)):
            Circle(SKETCH007_R_2, mode=Mode.SUBTRACT)
    extrude(amount=-POCKET002_DEPTH, mode=Mode.SUBTRACT)

    # Sketch008 (on Face5 of Pocket002) → Pocket003 (cut)
    with BuildSketch(Plane.XY.offset(1.75)):
        with Locations((0, 5.05)):
            Circle(SKETCH008_R)
        with Locations((0, 5.05)):
            Circle(SKETCH008_R_2, mode=Mode.SUBTRACT)
    extrude(amount=-POCKET003_DEPTH, mode=Mode.SUBTRACT)

    # Sketch009 (on Face5 of Pocket003) → Pocket004 (cut)
    with BuildSketch(Plane.XY.offset(1.75)):
        with Locations((0, 5.05)):
            Circle(SKETCH009_R)
        with Locations((0, 5.05)):
            Circle(SKETCH009_R_2, mode=Mode.SUBTRACT)
    extrude(amount=-POCKET004_DEPTH, mode=Mode.SUBTRACT)

    # Sketch010 (on Face5 of Pocket004) → Pocket005 (cut)
    with BuildSketch(Plane.XY.offset(1.75)):
        with Locations((0, 5.05)):
            Circle(SKETCH010_R)
        with Locations((0, 5.05)):
            Circle(SKETCH010_R_2, mode=Mode.SUBTRACT)
    extrude(amount=-POCKET005_DEPTH, mode=Mode.SUBTRACT)

    # Sketch011 (on Face5 of Pocket005) → Pocket006 (cut)
    with BuildSketch(Plane.XY.offset(1.75)):
        with Locations((0, 5.05)):
            Circle(SKETCH011_R)
        with Locations((0, 5.05)):
            Circle(SKETCH011_R_2, mode=Mode.SUBTRACT)
    extrude(amount=-POCKET006_DEPTH, mode=Mode.SUBTRACT)

    # Sketch012 (on Face5 of Pocket006) → Pocket007 (cut)
    with BuildSketch(Plane.XY.offset(1.75)):
        with Locations((0, 5.05)):
            Circle(SKETCH012_R)
        with Locations((0, 5.05)):
            Circle(SKETCH012_R_2, mode=Mode.SUBTRACT)
    extrude(amount=-POCKET007_DEPTH, mode=Mode.SUBTRACT)


solid = part.part
